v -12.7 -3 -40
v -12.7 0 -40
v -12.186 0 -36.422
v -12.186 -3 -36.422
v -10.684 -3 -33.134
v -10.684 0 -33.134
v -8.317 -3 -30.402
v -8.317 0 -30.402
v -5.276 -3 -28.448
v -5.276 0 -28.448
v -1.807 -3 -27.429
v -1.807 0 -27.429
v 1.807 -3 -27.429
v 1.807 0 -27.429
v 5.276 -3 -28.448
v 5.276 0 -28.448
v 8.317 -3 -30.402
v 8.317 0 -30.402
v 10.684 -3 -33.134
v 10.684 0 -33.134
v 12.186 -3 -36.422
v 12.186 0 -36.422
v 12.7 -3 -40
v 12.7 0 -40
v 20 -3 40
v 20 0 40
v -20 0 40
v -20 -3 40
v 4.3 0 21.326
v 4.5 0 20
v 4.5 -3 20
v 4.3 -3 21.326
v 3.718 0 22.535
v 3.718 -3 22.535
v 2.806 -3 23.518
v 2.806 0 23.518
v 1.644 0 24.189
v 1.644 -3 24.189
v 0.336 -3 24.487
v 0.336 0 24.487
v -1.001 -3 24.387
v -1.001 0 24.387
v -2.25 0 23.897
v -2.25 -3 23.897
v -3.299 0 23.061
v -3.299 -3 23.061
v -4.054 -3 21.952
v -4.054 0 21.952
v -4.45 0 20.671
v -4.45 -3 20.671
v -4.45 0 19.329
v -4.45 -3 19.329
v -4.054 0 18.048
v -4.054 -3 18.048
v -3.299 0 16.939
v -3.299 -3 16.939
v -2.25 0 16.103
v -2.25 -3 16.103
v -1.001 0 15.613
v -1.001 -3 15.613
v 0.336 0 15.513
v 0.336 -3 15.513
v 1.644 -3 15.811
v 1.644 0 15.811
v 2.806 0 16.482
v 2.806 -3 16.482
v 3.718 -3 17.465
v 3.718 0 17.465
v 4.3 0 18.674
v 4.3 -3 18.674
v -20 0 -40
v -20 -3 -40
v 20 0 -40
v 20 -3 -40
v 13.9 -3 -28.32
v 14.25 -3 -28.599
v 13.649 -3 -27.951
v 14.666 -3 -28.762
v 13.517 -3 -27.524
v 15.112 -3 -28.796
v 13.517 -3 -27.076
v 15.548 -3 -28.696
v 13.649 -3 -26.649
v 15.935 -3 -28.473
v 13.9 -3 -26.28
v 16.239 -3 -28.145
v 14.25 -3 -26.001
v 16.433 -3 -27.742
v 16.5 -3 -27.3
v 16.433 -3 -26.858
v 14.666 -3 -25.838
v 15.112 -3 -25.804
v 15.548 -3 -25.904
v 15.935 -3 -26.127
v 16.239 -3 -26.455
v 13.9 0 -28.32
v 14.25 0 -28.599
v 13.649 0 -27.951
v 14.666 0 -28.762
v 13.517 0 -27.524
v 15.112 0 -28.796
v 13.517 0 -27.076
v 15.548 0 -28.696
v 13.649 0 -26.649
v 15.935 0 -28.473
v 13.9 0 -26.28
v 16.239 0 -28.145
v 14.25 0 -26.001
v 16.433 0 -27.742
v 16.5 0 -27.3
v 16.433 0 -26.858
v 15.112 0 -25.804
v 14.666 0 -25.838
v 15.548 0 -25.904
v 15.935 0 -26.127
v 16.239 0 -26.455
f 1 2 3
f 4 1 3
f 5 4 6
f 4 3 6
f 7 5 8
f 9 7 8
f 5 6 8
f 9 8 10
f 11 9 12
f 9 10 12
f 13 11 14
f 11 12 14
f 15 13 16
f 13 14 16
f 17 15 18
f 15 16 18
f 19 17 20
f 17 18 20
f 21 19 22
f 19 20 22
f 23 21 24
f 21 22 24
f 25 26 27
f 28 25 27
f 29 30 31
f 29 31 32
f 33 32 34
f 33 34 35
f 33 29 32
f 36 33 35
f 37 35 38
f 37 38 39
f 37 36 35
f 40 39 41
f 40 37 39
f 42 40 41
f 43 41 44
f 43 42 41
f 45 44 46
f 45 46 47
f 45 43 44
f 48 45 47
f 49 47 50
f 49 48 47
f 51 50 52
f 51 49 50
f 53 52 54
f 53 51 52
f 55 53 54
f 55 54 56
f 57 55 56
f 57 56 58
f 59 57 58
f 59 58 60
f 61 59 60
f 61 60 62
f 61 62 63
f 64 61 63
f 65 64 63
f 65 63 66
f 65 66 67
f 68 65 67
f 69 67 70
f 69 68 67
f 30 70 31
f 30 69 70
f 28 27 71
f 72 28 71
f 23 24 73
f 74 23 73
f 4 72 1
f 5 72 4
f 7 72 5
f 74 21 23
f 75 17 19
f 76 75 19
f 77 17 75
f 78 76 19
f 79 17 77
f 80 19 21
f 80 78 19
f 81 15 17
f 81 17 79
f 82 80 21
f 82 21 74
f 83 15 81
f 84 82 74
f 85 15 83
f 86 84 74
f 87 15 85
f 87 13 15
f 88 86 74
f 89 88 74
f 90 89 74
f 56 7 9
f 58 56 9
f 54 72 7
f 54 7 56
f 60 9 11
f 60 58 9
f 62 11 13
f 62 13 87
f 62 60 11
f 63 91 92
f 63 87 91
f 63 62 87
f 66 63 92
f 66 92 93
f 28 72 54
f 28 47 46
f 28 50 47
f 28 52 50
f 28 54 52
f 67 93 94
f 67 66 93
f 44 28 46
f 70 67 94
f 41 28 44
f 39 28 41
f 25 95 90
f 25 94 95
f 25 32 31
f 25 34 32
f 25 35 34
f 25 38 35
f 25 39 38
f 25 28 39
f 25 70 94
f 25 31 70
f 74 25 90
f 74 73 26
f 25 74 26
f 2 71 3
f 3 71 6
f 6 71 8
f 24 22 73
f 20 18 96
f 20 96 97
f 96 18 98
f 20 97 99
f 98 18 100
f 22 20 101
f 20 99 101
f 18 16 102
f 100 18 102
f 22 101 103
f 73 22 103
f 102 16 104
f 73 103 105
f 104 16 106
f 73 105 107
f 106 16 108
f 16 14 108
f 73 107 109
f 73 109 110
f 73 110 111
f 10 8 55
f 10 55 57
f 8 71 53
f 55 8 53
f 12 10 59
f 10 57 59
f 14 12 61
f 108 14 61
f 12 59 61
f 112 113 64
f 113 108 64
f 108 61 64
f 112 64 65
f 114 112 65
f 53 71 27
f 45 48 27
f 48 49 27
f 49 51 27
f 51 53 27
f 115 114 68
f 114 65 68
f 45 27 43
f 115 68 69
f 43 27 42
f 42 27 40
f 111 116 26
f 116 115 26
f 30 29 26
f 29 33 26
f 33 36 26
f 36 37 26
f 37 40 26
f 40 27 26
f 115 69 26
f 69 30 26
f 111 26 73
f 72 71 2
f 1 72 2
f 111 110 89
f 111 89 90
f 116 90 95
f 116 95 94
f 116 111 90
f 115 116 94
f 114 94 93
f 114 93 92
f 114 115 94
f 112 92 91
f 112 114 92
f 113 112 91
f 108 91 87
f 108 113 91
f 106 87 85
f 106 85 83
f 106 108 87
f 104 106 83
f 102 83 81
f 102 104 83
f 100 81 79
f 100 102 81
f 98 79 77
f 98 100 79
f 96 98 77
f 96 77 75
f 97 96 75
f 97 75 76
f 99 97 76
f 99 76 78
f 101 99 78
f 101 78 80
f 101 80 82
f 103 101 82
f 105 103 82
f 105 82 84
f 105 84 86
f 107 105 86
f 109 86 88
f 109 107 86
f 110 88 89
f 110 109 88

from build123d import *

# Parameters (mm, degrees)
F0_R     = 1.5
F0_R_2   = 4.5
F1_DEPTH = 3


with BuildPart() as f1:
    # F0 (on Front) → F1 (new body)
    with BuildSketch(Plane.XZ):
        with BuildLine():
            Line((20, 40), (-20, 40))
            Line((-20, 40), (-20, -40))
            Line((-20, -40), (-12.7, -40))
            ThreePointArc((-12.7, -40), (0, -27.3), (12.7, -40))
            Line((12.7, -40), (20, -40))
            Line((20, -40), (20, 40))
        make_face()
        with Locations((15, -27.3)):
            Circle(F0_R, mode=Mode.SUBTRACT)
        with Locations((0, 20)):
            Circle(F0_R_2, mode=Mode.SUBTRACT)
    extrude(amount=F1_DEPTH)


solid = f1.part
